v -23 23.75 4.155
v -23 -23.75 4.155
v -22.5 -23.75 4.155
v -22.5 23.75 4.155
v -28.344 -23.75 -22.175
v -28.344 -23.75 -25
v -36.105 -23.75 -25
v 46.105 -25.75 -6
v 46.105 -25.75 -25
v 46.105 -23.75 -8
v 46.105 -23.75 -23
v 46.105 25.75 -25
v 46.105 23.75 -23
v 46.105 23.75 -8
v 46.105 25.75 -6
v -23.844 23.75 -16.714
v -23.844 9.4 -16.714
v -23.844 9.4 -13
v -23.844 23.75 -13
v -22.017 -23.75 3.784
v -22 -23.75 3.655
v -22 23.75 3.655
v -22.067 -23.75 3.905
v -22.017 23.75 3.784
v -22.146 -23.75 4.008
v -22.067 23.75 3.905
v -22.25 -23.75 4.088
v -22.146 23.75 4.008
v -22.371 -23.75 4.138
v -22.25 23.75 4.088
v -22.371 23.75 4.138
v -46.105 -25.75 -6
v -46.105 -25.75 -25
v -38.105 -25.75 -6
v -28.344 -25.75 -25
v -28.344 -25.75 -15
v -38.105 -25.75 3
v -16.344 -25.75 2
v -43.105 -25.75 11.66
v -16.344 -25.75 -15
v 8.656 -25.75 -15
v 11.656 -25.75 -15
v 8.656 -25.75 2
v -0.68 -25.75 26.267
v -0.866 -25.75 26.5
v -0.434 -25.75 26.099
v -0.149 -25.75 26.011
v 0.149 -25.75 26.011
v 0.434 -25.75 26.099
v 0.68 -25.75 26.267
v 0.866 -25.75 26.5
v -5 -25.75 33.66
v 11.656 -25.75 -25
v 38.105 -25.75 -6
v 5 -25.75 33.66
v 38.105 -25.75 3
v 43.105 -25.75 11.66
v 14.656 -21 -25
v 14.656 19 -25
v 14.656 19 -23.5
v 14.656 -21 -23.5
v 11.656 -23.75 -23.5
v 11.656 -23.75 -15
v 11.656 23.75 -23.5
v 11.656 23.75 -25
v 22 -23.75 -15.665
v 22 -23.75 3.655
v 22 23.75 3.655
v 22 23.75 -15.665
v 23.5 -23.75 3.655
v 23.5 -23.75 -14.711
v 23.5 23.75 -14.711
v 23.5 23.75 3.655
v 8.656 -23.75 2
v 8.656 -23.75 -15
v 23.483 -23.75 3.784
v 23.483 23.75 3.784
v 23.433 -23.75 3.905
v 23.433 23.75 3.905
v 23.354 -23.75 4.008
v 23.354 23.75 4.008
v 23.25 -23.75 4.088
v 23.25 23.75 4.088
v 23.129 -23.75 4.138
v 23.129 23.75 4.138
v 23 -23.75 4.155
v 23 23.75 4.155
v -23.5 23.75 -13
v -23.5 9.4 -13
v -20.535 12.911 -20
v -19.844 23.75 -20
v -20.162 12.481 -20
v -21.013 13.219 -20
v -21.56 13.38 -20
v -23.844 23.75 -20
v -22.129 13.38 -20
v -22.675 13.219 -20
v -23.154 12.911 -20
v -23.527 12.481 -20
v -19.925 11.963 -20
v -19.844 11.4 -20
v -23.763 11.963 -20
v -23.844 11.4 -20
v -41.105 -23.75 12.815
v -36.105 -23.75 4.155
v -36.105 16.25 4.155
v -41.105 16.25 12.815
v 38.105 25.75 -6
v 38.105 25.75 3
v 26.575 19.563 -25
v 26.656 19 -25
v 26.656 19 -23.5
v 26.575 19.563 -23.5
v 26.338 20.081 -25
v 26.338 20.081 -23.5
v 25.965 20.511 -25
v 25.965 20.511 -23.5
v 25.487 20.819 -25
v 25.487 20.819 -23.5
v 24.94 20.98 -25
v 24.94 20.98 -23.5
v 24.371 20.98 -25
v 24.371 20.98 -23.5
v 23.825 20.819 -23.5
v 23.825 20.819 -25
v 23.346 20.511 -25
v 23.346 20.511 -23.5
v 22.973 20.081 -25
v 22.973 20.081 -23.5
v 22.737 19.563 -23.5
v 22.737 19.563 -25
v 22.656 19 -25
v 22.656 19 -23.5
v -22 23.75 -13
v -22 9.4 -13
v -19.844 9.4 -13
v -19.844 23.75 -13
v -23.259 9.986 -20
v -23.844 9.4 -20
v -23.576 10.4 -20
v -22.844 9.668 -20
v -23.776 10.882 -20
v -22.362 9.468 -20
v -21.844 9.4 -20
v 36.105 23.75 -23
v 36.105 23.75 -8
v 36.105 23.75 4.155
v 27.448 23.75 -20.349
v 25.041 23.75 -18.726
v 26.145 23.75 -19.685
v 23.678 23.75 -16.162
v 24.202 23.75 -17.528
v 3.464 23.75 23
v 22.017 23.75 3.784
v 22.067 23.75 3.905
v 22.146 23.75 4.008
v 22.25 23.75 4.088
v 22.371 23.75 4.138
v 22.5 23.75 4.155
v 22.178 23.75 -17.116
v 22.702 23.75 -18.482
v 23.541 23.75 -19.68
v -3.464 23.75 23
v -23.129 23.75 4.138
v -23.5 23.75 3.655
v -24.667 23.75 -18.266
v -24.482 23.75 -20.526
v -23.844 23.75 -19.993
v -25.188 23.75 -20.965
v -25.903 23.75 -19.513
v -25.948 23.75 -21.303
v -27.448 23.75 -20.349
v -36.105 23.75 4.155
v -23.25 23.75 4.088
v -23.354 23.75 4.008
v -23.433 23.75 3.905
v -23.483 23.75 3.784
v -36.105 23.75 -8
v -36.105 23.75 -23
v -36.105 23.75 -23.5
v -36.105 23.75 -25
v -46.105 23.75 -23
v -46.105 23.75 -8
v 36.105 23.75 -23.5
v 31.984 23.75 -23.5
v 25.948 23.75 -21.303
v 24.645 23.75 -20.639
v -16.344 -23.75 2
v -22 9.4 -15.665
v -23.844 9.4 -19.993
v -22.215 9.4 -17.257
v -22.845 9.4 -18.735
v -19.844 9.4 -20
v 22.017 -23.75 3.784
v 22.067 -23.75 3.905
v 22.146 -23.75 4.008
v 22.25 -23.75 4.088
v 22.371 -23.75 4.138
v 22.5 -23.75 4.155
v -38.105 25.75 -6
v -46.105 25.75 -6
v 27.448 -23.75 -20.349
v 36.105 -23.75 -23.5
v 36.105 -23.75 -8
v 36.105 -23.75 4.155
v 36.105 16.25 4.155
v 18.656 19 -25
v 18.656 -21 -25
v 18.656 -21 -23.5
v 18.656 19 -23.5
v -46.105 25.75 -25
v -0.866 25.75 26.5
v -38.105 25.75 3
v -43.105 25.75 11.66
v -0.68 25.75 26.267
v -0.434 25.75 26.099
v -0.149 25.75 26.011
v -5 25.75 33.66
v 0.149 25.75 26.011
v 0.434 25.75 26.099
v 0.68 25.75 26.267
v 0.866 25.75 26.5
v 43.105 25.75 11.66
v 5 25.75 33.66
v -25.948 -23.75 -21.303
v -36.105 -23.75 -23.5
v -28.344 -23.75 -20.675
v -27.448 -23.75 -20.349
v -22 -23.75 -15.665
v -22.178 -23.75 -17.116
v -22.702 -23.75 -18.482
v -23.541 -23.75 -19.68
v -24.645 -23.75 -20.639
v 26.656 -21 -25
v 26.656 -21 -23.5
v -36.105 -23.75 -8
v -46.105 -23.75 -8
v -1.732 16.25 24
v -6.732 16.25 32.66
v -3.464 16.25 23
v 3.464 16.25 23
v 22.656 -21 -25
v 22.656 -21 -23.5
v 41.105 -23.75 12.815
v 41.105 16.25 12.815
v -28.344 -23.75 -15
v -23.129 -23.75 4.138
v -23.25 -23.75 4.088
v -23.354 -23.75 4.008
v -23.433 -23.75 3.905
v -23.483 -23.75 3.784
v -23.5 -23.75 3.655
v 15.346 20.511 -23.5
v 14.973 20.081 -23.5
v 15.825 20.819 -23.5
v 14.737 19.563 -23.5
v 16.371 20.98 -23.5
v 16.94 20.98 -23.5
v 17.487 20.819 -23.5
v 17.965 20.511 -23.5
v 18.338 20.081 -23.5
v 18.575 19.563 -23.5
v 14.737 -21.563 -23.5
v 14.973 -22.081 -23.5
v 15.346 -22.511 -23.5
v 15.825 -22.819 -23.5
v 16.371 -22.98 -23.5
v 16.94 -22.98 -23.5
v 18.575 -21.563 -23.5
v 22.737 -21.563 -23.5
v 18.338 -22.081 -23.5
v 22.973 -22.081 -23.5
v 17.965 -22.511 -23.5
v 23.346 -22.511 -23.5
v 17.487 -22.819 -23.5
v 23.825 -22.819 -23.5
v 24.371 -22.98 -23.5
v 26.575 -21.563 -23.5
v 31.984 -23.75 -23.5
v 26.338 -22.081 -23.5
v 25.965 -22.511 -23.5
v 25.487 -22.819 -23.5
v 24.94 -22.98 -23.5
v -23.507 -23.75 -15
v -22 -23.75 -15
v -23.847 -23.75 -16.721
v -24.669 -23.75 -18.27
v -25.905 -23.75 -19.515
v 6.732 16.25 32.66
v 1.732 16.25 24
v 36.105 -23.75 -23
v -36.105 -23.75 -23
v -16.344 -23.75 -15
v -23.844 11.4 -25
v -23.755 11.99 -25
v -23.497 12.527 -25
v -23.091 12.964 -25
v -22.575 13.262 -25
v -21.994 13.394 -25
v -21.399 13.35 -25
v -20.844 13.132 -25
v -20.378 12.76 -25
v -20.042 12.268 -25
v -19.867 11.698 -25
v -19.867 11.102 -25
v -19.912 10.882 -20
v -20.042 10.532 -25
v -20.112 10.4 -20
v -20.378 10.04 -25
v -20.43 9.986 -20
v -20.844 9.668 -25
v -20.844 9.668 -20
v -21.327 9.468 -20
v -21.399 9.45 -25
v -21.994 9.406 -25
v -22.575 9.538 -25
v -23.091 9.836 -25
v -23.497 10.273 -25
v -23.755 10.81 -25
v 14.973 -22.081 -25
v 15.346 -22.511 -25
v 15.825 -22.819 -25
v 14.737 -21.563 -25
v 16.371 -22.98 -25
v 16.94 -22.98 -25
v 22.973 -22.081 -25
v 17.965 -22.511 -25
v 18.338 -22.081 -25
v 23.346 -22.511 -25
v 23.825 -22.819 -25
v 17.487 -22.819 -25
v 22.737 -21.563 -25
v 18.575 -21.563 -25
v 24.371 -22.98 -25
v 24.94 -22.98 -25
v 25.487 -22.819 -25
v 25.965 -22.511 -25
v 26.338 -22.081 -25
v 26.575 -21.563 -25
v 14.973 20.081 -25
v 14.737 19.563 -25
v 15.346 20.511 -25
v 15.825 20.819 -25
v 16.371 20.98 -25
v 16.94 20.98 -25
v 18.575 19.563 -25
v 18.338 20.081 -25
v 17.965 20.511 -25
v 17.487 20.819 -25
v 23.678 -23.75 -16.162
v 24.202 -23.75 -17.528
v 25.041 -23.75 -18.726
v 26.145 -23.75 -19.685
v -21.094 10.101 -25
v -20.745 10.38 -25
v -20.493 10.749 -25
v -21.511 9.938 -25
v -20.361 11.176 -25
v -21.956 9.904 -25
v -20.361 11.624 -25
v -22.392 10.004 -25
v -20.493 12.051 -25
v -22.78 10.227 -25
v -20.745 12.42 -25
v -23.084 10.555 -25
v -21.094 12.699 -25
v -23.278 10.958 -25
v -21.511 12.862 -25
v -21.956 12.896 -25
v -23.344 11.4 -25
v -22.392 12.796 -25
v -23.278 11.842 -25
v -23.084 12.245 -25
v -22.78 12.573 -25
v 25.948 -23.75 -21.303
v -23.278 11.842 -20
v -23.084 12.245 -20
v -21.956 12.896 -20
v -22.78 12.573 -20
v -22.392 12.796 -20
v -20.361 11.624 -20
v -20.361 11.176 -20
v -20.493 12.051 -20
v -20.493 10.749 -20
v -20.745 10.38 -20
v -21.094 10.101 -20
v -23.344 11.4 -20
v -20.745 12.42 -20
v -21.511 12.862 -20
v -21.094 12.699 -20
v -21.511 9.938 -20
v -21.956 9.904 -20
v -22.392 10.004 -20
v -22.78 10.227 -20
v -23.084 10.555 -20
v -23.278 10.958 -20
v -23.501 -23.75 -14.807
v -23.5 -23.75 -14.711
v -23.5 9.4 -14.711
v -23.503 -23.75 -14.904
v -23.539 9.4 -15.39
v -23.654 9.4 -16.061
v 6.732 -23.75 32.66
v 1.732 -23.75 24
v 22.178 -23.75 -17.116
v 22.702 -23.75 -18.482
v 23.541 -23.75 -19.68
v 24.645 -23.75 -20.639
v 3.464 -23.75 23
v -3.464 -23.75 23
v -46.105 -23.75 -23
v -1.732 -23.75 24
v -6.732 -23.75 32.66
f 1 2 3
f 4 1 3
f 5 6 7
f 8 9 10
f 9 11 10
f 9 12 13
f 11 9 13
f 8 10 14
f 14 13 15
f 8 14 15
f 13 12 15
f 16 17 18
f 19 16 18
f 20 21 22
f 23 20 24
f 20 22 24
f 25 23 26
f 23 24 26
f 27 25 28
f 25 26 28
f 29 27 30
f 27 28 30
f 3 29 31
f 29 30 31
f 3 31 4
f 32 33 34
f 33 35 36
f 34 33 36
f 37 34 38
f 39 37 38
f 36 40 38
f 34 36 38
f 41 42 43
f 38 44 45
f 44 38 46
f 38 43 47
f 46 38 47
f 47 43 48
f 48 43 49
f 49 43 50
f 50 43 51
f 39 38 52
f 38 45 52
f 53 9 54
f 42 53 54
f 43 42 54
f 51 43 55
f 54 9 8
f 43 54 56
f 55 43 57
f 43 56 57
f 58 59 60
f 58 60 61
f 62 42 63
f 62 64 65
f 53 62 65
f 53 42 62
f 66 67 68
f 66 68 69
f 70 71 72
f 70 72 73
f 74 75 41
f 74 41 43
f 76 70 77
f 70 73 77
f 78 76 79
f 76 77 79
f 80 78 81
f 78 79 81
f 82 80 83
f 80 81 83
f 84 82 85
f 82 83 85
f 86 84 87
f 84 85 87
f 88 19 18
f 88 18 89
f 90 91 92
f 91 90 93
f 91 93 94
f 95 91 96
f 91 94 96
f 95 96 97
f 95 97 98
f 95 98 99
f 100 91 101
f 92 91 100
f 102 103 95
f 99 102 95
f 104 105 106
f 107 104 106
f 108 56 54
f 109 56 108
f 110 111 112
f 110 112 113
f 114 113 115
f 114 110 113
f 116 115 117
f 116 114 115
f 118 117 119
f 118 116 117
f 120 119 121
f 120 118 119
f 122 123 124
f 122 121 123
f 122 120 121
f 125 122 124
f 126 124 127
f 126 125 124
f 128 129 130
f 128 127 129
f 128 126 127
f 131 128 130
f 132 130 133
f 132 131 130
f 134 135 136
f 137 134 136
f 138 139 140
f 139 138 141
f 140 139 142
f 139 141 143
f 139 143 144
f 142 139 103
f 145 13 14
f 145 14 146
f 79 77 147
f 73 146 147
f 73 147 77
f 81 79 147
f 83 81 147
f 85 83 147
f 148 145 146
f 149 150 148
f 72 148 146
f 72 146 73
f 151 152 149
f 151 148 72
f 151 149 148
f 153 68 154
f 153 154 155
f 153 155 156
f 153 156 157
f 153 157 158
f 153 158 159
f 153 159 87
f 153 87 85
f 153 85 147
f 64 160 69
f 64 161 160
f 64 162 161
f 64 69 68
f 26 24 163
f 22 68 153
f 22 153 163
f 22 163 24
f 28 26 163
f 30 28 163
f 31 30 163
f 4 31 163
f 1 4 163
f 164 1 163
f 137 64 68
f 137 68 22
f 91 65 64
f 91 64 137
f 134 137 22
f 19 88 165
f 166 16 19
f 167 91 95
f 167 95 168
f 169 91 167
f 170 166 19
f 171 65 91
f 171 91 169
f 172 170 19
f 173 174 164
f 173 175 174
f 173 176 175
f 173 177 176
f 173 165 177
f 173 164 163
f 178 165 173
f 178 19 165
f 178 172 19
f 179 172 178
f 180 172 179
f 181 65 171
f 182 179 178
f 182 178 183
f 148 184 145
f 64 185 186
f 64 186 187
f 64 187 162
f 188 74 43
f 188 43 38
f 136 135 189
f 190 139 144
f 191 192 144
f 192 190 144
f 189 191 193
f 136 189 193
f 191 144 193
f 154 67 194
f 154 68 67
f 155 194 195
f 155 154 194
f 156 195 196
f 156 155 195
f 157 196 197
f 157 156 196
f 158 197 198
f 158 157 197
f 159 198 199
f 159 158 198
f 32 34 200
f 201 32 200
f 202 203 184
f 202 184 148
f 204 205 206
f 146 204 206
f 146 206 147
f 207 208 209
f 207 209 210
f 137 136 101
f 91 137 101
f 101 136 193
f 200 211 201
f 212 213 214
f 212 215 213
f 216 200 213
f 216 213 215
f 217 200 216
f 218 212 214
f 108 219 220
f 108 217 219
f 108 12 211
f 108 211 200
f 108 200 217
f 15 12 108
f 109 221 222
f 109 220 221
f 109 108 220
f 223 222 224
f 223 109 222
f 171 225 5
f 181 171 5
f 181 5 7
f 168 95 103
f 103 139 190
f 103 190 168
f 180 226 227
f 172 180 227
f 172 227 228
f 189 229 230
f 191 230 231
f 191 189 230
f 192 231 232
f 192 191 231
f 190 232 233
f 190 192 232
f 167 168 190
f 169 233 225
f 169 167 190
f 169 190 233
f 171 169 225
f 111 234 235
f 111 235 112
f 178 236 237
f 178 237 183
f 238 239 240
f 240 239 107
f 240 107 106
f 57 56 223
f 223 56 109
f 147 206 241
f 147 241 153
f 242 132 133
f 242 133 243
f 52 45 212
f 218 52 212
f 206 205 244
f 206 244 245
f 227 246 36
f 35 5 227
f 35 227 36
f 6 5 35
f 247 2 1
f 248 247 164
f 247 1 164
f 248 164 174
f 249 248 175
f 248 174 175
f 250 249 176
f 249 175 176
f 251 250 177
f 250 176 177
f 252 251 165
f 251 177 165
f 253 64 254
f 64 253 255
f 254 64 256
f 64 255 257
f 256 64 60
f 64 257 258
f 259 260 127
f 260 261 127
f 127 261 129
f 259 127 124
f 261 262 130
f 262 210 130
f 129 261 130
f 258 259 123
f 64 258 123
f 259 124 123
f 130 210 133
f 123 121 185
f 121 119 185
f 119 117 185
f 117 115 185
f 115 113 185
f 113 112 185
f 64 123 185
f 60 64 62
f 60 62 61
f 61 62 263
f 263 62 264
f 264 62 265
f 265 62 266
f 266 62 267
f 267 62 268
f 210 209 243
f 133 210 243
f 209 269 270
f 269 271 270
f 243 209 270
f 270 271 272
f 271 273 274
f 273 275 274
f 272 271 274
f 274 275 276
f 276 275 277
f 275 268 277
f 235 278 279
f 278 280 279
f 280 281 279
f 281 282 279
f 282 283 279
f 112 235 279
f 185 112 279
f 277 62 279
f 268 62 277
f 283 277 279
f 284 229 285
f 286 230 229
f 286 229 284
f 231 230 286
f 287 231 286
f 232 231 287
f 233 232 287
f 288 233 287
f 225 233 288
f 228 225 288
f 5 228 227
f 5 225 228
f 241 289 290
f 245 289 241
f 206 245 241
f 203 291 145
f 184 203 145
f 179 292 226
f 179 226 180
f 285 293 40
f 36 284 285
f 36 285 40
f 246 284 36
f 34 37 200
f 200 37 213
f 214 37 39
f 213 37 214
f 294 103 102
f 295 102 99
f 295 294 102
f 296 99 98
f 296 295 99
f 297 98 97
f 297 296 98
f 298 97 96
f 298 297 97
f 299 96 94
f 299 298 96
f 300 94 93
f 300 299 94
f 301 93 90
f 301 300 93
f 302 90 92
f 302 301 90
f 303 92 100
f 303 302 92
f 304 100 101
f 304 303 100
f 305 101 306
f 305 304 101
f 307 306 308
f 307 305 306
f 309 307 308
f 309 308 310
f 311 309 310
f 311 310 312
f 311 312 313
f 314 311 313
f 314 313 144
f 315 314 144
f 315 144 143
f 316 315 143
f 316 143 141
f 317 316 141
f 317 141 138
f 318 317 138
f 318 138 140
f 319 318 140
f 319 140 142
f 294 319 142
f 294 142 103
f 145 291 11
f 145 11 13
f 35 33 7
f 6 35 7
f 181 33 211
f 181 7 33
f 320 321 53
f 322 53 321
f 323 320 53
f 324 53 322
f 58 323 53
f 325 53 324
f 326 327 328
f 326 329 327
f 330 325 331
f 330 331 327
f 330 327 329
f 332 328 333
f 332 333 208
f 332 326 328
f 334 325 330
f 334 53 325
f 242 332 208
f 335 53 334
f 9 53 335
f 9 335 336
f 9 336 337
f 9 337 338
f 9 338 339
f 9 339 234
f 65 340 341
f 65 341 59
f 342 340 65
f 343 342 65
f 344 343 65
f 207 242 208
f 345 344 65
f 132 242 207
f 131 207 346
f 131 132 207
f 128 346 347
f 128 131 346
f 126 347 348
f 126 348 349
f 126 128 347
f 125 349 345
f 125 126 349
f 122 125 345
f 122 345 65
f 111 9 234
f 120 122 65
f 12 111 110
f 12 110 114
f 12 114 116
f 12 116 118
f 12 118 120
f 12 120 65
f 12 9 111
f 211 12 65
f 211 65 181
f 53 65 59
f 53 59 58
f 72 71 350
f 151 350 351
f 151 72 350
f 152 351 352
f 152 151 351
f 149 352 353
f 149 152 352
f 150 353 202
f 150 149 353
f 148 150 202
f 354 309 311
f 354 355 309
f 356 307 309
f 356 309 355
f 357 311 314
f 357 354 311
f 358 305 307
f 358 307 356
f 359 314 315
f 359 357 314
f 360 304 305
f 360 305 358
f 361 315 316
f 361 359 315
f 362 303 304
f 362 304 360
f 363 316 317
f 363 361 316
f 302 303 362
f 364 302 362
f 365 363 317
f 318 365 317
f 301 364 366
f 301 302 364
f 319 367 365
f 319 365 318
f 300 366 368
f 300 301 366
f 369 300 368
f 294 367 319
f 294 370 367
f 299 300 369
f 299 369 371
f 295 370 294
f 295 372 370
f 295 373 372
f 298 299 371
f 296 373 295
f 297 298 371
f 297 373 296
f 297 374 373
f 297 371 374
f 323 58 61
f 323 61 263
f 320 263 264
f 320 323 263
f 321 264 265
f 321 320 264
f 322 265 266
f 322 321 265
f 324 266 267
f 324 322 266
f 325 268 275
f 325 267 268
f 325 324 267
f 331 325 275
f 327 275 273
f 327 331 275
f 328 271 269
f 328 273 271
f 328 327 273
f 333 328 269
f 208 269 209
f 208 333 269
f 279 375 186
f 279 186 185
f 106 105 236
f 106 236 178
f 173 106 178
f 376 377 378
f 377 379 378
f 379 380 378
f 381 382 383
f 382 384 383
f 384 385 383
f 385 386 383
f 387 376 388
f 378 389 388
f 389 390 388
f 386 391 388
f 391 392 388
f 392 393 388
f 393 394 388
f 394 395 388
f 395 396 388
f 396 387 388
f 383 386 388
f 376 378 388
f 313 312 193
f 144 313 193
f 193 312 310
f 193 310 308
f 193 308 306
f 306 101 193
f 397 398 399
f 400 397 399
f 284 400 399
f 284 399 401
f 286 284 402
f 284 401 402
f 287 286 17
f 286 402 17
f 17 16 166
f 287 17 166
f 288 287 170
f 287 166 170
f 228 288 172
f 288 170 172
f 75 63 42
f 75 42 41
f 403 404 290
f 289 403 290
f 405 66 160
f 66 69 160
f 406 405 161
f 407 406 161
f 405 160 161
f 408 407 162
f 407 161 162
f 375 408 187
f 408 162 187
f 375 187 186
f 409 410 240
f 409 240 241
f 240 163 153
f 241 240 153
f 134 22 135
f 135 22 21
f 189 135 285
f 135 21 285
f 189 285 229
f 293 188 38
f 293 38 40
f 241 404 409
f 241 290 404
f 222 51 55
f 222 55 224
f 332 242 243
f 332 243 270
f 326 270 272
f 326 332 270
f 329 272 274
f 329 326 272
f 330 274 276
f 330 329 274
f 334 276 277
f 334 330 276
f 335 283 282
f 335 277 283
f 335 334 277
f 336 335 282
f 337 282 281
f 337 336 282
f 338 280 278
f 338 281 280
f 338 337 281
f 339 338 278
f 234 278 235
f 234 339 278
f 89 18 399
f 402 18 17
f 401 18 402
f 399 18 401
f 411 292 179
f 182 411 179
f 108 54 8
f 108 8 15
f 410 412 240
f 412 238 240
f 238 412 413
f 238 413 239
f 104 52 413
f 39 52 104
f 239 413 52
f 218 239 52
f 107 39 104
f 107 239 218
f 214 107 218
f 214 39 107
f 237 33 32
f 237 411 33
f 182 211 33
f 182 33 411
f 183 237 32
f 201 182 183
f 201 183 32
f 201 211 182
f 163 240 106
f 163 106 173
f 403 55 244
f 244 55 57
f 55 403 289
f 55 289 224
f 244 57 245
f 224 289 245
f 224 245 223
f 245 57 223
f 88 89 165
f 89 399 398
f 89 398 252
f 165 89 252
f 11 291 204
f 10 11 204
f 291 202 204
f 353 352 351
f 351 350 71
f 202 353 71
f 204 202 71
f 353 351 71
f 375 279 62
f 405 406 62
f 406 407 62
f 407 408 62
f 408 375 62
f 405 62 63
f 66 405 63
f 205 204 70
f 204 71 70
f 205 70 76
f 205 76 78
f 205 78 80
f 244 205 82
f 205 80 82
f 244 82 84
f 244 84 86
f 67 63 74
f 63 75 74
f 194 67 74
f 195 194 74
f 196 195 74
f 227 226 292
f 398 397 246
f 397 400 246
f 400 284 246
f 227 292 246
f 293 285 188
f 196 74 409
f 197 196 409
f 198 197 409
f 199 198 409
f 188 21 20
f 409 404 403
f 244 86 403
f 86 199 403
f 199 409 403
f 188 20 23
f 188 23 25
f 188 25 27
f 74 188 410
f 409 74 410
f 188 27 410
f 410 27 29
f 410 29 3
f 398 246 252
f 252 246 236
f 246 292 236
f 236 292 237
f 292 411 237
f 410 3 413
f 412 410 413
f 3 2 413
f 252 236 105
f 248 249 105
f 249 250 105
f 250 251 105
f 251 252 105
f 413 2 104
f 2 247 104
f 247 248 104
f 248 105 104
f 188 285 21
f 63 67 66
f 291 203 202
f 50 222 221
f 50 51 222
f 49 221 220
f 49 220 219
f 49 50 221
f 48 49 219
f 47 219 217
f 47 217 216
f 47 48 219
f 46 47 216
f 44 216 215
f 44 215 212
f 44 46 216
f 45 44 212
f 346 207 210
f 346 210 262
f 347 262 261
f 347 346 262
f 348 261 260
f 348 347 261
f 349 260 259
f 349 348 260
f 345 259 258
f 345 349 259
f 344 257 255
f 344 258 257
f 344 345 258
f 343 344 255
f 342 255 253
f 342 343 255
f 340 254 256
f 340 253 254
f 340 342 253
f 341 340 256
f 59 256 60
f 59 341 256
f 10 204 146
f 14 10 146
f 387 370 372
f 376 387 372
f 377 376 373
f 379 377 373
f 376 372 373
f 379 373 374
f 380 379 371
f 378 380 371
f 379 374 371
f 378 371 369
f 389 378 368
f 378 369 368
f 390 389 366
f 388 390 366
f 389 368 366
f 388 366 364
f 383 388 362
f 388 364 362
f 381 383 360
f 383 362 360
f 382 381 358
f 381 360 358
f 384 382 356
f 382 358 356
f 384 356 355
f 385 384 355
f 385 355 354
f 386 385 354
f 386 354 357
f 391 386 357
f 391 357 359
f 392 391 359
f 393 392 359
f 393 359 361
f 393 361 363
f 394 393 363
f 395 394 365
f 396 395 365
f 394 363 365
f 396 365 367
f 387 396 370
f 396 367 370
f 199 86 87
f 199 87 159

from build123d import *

# Parameters (mm, degrees)
SKETCH1_W                 = 76.21
SKETCH1_H                 = 51.5
BOSS_EXTRUDE1_DEPTH       = 25
SHELL1_T                  = -2
CUT_EXTRUDE1_DEPTH        = 53.345520582
SKETCH4_W                 = 43.999864015
SKETCH4_H                 = 51.5
SKETCH4_W_2               = 39.690462938
SKETCH4_H_2               = 47.5
BOSS_EXTRUDE2_DEPTH       = 10
BOSS_EXTRUDE3_REACH       = 75.765
FILLET1_R                 = 0.5
FILLET3_R                 = 6
FILLET1_OF_MIRROR3_R      = 0.5
FILLET3_OF_MIRROR3_R      = 6
CUT_EXTRUDE2_DEPTH        = 74.765193194
BOSS_EXTRUDE4_REACH       = 75.765
SKETCH7_W                 = 24.449300912
SKETCH7_H                 = 1.5
CUT_EXTRUDE3_REACH        = 79.215
LPATTERN1_COUNT           = 2
LPATTERN1_PITCH           = 8
SKETCH9_R                 = 2
SKETCH9_R_2               = 1.5
BOSS_EXTRUDE5_DEPTH       = 5
SKETCH10_W                = 4
SKETCH10_H                = 4
BOSS_EXTRUDE6_DEPTH       = 7
BOSS_EXTRUDE7_DEPTH       = 10.35
SKETCH12_R                = 2
BOSS_EXTRUDE8_DEPTH       = 10
F_1_5MM_DOWEL_HOLE1_D     = 1.5
F_1_5MM_DOWEL_HOLE1_DEPTH = 5
F_1_5MM_DOWEL_HOLE1_TIP   = 0.450645464
FILLET5_R                 = 1
SKETCH15_W                = 19
SKETCH15_H                = 51.5
SKETCH15_W_2              = 15
SKETCH15_H_2              = 47.5
BOSS_EXTRUDE9_DEPTH       = 10
CUT_EXTRUDE4_REACH        = 91.835
SKETCH16_W                = 15
SKETCH16_H                = 47.5
BOSS_EXTRUDE10_REACH      = 91.93
SKETCH19_W                = 10
SKETCH19_H                = 7.5


with BuildPart() as part:
    # Sketch1 → Boss-Extrude1 (new, symmetric)
    with BuildSketch(Plane.XY):
        Rectangle(SKETCH1_W, SKETCH1_H)
    extrude(amount=BOSS_EXTRUDE1_DEPTH, both=True)

    # Shell1
    shell1_openings = [part.faces().sort_by_distance(p)[0] for p in [
        (0, 0, -25),
    ]]
    offset(amount=SHELL1_T, openings=shell1_openings, kind=Kind.INTERSECTION)

    # Sketch3 → Cut-Extrude1 (cut, symmetric)
    with BuildSketch(Plane(origin=(0, 0, 0), x_dir=(1, 0, 0), z_dir=(0, 1, 0))):
        Polygon((0, -25), (-38.105, -3.000067993), (-38.105, -25), align=None)
    cut_extrude1 = extrude(amount=CUT_EXTRUDE1_DEPTH, both=True, mode=Mode.SUBTRACT)

    # Mirror1: Cut-Extrude1 across plane
    add(cut_extrude1.mirror(Plane(origin=(0, 0, 0), x_dir=(0, 0, 1), z_dir=(1, 0, 0))), mode=Mode.SUBTRACT)

    # Sketch4 → Boss-Extrude2 (add)
    with BuildSketch(Plane(origin=(-10.825317547, 0, 18.75), x_dir=(0.8660254037844363, 0, 0.5000000000000042), z_dir=(-0.5000000000000041, 0, 0.8660254037844362))):
        with Locations((-9.499932008, 0)):
            Rectangle(SKETCH4_W, SKETCH4_H)
        with Locations((-9.345231469, 0)):
            Rectangle(SKETCH4_W_2, SKETCH4_H_2, mode=Mode.SUBTRACT)
    boss_extrude2 = extrude(amount=BOSS_EXTRUDE2_DEPTH)

    # Mirror2: Boss-Extrude2 across plane
    add(boss_extrude2.mirror(Plane(origin=(0, 0, 0), x_dir=(0, 0, 1), z_dir=(1, 0, 0))))

    # Sketch5 → Boss-Extrude3 (add, up to next)
    with BuildSketch(Plane(origin=(0, -23.75, 0), x_dir=(1, 0, 0), z_dir=(0, 1, 0)), mode=Mode.PRIVATE) as boss_extrude3_sk1:
        Polygon((-22, 19.866199846), (-36.105, 25), (-36.105, 23.5), (-23.5, 18.912155197), (-23.5, -4.154768531), (-22, -4.154768531), align=None)
    boss_extrude3_tool1 = extrude(boss_extrude3_sk1.sketch, amount=BOSS_EXTRUDE3_REACH, mode=Mode.PRIVATE) - part.part
    boss_extrude3 = boss_extrude3_tool1.solids().sort_by_distance((-29.163272, -23.75, -22.128757))[0]
    add(boss_extrude3)

    # Fillet1
    fillet1_edges = [part.edges().sort_by_distance(p)[0] for p in [
        (-22, 0, 4.154768531),
        (-23.5, 0, 4.154768531),
    ]]
    fillet(fillet1_edges, radius=FILLET1_R)

    # Fillet3
    fillet3_edges = [part.edges().sort_by_distance(p)[0] for p in [
        (-22, 0, -19.866199846),
        (-23.5, 0, -18.912155197),
    ]]
    fillet(fillet3_edges, radius=FILLET3_R)

    # Mirror3: Boss-Extrude3 across plane
    add(boss_extrude3.mirror(Plane(origin=(0, 0, 0), x_dir=(0, 0, 1), z_dir=(1, 0, 0))))

    # Fillet1 of Mirror3
    fillet1_of_mirror3_edges = [part.edges().sort_by_distance(p)[0] for p in [
        (22, 0, 4.154768531),
        (23.5, 0, 4.154768531),
    ]]
    fillet(fillet1_of_mirror3_edges, radius=FILLET1_OF_MIRROR3_R)

    # Fillet3 of Mirror3
    fillet3_of_mirror3_edges = [part.edges().sort_by_distance(p)[0] for p in [
        (22, 0, -19.866199846),
        (23.5, 0, -18.912155197),
    ]]
    fillet(fillet3_of_mirror3_edges, radius=FILLET3_OF_MIRROR3_R)

    # Sketch6 → Cut-Extrude2 (cut, through all)
    with BuildSketch(Plane(origin=(0, -23.75, 0), x_dir=(1, 0, 0), z_dir=(0, 1, 0))):
        Polygon((-28.344300912, 25), (11.655699088, 25), (11.655699088, 15), (8.655699088, 15), (8.655699088, -2), (-16.344300912, -2), (-16.344300912, 15), (-28.344300912, 15), align=None)
    extrude(amount=-CUT_EXTRUDE2_DEPTH, mode=Mode.SUBTRACT)

    # Sketch7 → Boss-Extrude4 (add, up to next)
    with BuildSketch(Plane(origin=(0, -23.75, 0), x_dir=(1, 0, 0), z_dir=(0, 1, 0)), mode=Mode.PRIVATE) as boss_extrude4_sk1:
        with Locations((23.880349544, 24.25)):
            Rectangle(SKETCH7_W, SKETCH7_H)
    boss_extrude4_tool1 = extrude(boss_extrude4_sk1.sketch, amount=BOSS_EXTRUDE4_REACH, mode=Mode.PRIVATE) - part.part
    add(boss_extrude4_tool1.solids().sort_by_distance((23.88035, -23.75, -24.25))[0])

    # Sketch8 → Cut-Extrude3 (cut, up to next)
    with BuildSketch(Plane(origin=(0, 0, -25), x_dir=(-1, 0, 0), z_dir=(0, 0, -1)), mode=Mode.PRIVATE) as cut_extrude3_sk1:
        with BuildLine():
            Line((-14.655699088, 19), (-14.655699088, -21))
            ThreePointArc((-14.655699088, -21), (-16.655699088, -23), (-18.655699088, -21))
            Line((-18.655699088, -21), (-18.655699088, 19))
            ThreePointArc((-18.655699088, 19), (-16.655699088, 21), (-14.655699088, 19))
        make_face()
    cut_extrude3_tool1 = extrude(cut_extrude3_sk1.sketch, amount=-CUT_EXTRUDE3_REACH, mode=Mode.PRIVATE) & part.part
    cut_extrude3 = cut_extrude3_tool1.solids().sort_by_distance((16.655699, -1, -25))[0]
    add(cut_extrude3, mode=Mode.SUBTRACT)

    # LPattern1: Cut-Extrude3 ×2
    with Locations(*[(i * LPATTERN1_PITCH, 0, 0) for i in range(1, LPATTERN1_COUNT)]):
        add(cut_extrude3, mode=Mode.SUBTRACT)



with BuildPart() as body_2:
    # Sketch9 → Boss-Extrude5 (new body)
    with BuildSketch(Plane(origin=(0, 0, -25), x_dir=(-1, 0, 0), z_dir=(0, 0, -1))):
        with Locations((21.844300912, 11.4)):
            Circle(SKETCH9_R)
        with Locations((21.844300912, 11.4)):
            Circle(SKETCH9_R_2, mode=Mode.SUBTRACT)
    extrude(amount=-BOSS_EXTRUDE5_DEPTH)

    # Sketch10 → Boss-Extrude6 (add)
    with BuildSketch(Plane.XY.offset(-20)):
        with Locations((-21.844300912, 11.4)):
            Rectangle(SKETCH10_W, SKETCH10_H)
    extrude(amount=BOSS_EXTRUDE6_DEPTH)


with BuildPart() as part_1:
    add(part.part)

    add(body_2.part)  # Boss-Extrude7 merges body 2
    # Sketch11 → Boss-Extrude7 (add)
    with BuildSketch(Plane(origin=(0, 13.4, 0), x_dir=(1, 0, 0), z_dir=(0, 1, 0))):
        Polygon((-19.844300912, 20), (-21.844300912, 20), (-23.844300912, 20), (-23.844300912, 13), (-19.844300912, 13), align=None)
    extrude(amount=BOSS_EXTRUDE7_DEPTH)

    # Sketch12 → Boss-Extrude8 (add)
    with BuildSketch(Plane(origin=(0, 0, -25), x_dir=(-1, 0, 0), z_dir=(0, 0, -1))):
        with Locations((39.344300912, -7.5)):
            Circle(SKETCH12_R)
    extrude(amount=-BOSS_EXTRUDE8_DEPTH)

    # Ø1.5mm Dowel Hole1
    with Locations(Plane(origin=(0, 0, -25), x_dir=(-1, 0, 0), z_dir=(0, 0, -1))):
        with Locations((39.344300912, -7.5)):
            Hole(F_1_5MM_DOWEL_HOLE1_D / 2, depth=F_1_5MM_DOWEL_HOLE1_DEPTH)
            with Locations((0, 0, -(F_1_5MM_DOWEL_HOLE1_DEPTH + F_1_5MM_DOWEL_HOLE1_TIP / 2))):  # 118° drill point
                Cone(0, F_1_5MM_DOWEL_HOLE1_D / 2, F_1_5MM_DOWEL_HOLE1_TIP, mode=Mode.SUBTRACT)

    # Fillet5
    fillet5_edges = [part_1.edges().sort_by_distance(p)[0] for p in [
        (0, 0, 25),
    ]]
    fillet(fillet5_edges, radius=FILLET5_R)

    # Sketch15 → Boss-Extrude9 (add)
    with BuildSketch(Plane.ZY.offset(-36.105)):
        with Locations((-15.5, 0)):
            Rectangle(SKETCH15_W, SKETCH15_H)
        with Locations((-15.5, 0)):
            Rectangle(SKETCH15_W_2, SKETCH15_H_2, mode=Mode.SUBTRACT)
    boss_extrude9 = extrude(amount=-BOSS_EXTRUDE9_DEPTH)

    # Sketch16 → Cut-Extrude4 (cut, up to next)
    with BuildSketch(Plane.ZY.offset(-36.105), mode=Mode.PRIVATE) as cut_extrude4_sk1:
        with Locations((-15.5, 0)):
            Rectangle(SKETCH16_W, SKETCH16_H)
    cut_extrude4_tool1 = extrude(cut_extrude4_sk1.sketch, amount=-CUT_EXTRUDE4_REACH, mode=Mode.PRIVATE) & part_1.part
    cut_extrude4 = cut_extrude4_tool1.solids().sort_by_distance((36.105, 0, -15.5))[0]
    add(cut_extrude4, mode=Mode.SUBTRACT)

    # Mirror4: Boss-Extrude9, Cut-Extrude4 mirrored; each copy of Cut-Extrude4 runs up to whatever stops it at its own place
    mirror4_before = part_1.part  # the part as the pattern finds it: every copy runs up to it
    add(boss_extrude9.mirror(Plane(origin=(0, 0, 0), x_dir=(0, 0, 1), z_dir=(1, 0, 0))))
    mirror4_cut_extrude4_long = extrude(cut_extrude4_sk1.sketch, amount=-CUT_EXTRUDE4_REACH, mode=Mode.PRIVATE)
    mirror4_cut_extrude4_tool = mirror4_cut_extrude4_long.mirror(Plane(origin=(0, 0, 0), x_dir=(0, 0, 1), z_dir=(1, 0, 0))) & mirror4_before
    add(mirror4_cut_extrude4_tool.solids().sort_by_distance((-36.105, 0, -15.5))[0], mode=Mode.SUBTRACT)

    # Sketch19 → Boss-Extrude10 (add, up to next)
    with BuildSketch(Plane(origin=(-25.279682453, 0, -14.595231469), x_dir=(0.5000000000000041, 0, -0.8660254037844364), z_dir=(0.8660254037844364, 0, 0.5000000000000041)), mode=Mode.PRIVATE) as boss_extrude10_sk1:
        with Locations((-26.650635095, 20)):
            Rectangle(SKETCH19_W, SKETCH19_H)
    boss_extrude10_tool1 = extrude(boss_extrude10_sk1.sketch, amount=BOSS_EXTRUDE10_REACH, mode=Mode.PRIVATE) - part_1.part
    boss_extrude10 = boss_extrude10_tool1.solids().sort_by_distance((-38.605, 20, 8.484896))[0]
    add(boss_extrude10)

    # Mirror5: Boss-Extrude10 across plane
    add(boss_extrude10.mirror(Plane(origin=(0, 0, 0), x_dir=(0, 0, 1), z_dir=(1, 0, 0))))


solid = part_1.part
